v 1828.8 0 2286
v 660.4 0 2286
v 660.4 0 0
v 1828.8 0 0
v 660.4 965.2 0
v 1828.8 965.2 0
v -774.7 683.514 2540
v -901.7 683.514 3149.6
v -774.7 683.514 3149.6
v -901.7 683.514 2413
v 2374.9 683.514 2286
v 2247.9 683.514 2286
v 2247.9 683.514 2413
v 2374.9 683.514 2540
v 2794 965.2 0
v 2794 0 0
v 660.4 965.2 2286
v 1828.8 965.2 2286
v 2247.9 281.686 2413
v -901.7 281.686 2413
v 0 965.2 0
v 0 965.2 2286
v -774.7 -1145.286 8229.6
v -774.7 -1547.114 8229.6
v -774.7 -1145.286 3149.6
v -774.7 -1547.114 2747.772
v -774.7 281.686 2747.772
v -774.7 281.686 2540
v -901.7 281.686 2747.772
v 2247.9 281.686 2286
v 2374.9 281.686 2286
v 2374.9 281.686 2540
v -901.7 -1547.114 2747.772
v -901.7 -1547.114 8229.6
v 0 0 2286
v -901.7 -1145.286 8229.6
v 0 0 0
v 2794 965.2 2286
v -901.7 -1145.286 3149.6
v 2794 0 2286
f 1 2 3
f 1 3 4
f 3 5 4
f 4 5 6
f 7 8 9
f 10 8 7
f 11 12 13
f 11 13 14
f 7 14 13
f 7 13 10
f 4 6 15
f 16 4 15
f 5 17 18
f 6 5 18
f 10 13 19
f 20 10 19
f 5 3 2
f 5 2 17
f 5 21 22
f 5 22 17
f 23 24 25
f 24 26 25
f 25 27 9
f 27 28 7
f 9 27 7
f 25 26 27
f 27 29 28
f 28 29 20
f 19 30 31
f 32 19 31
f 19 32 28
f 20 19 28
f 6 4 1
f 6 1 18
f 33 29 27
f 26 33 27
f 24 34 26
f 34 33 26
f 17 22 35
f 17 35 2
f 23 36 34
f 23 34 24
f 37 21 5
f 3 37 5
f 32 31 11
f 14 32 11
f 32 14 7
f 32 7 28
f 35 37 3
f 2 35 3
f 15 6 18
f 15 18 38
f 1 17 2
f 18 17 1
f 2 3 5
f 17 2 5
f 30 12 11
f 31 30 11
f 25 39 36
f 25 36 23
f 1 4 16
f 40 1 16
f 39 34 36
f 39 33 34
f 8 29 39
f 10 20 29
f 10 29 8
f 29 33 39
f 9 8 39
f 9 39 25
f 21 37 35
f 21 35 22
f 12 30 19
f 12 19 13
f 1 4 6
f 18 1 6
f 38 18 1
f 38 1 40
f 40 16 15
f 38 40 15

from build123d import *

# Parameters (mm, degrees)
F0_W      = 660.4
F0_H      = 965.2
F1_DEPTH  = 2286
F0_W_2    = 1168.4
F2_DEPTH  = 2286
F0_W_3    = 965.2
F3_DEPTH  = 2286
F4_W      = 127
F4_H      = 401.828
F5_DEPTH  = 254
F6_W      = 401.828
F6_H      = 127
F7_DEPTH  = 3149.6
F8_W      = 127
F8_H      = 401.828
F9_DEPTH  = 609.6
F10_W     = 127
F10_H     = 401.828
F11_DEPTH = 1828.8
F12_W     = 127
F12_H     = 401.828
F13_DEPTH = 5080


with BuildPart() as f1:
    # F0 (on Top) → F1 (new body)
    with BuildSketch(Plane.XY):
        with Locations((330.2, 482.6)):
            Rectangle(F0_W, F0_H)
    extrude(amount=F1_DEPTH)


with BuildPart() as f2:
    # F0 (on Top) → F2 (new body)
    with BuildSketch(Plane.XY):
        with Locations((1244.6, 482.6)):
            Rectangle(F0_W_2, F0_H)
    extrude(amount=F2_DEPTH)


with BuildPart() as f3:
    # F0 (on Top) → F3 (new body)
    with BuildSketch(Plane.XY):
        with Locations((2311.4, 482.6)):
            Rectangle(F0_W_3, F0_H)
    extrude(amount=F3_DEPTH)


with BuildPart() as f5:
    # F4 (on face) → F5 (new body)
    with BuildSketch(Plane.XY.offset(2286)):
        with Locations((2311.4, 482.6)):
            Rectangle(F4_W, F4_H)
    extrude(amount=F5_DEPTH)

    # F6 (on face) → F7 (join)
    with BuildSketch(Plane(origin=(2247.9, 0, 0), x_dir=(0, -1, 0), z_dir=(-1, 0, 0))):
        with Locations((-482.6, 2476.5)):
            Rectangle(F6_W, F6_H)
    extrude(amount=F7_DEPTH)

    # F8 (on face) → F9 (join)
    with BuildSketch(Plane.XY.offset(2540)):
        with Locations((-838.2, 482.6)):
            Rectangle(F8_W, F8_H)
    extrude(amount=F9_DEPTH)

    # F10 (on face) → F11 (join)
    with BuildSketch(Plane.XZ.offset(-281.686)):
        with Locations((-838.2, 2948.686)):
            Rectangle(F10_W, F10_H)
    extrude(amount=F11_DEPTH)

    # F12 (on face) → F13 (join)
    with BuildSketch(Plane.XY.offset(3149.6)):
        with Locations((-838.2, -1346.2)):
            Rectangle(F12_W, F12_H)
    extrude(amount=F13_DEPTH)


solid = Compound([f1.part, f2.part, f3.part, f5.part])
